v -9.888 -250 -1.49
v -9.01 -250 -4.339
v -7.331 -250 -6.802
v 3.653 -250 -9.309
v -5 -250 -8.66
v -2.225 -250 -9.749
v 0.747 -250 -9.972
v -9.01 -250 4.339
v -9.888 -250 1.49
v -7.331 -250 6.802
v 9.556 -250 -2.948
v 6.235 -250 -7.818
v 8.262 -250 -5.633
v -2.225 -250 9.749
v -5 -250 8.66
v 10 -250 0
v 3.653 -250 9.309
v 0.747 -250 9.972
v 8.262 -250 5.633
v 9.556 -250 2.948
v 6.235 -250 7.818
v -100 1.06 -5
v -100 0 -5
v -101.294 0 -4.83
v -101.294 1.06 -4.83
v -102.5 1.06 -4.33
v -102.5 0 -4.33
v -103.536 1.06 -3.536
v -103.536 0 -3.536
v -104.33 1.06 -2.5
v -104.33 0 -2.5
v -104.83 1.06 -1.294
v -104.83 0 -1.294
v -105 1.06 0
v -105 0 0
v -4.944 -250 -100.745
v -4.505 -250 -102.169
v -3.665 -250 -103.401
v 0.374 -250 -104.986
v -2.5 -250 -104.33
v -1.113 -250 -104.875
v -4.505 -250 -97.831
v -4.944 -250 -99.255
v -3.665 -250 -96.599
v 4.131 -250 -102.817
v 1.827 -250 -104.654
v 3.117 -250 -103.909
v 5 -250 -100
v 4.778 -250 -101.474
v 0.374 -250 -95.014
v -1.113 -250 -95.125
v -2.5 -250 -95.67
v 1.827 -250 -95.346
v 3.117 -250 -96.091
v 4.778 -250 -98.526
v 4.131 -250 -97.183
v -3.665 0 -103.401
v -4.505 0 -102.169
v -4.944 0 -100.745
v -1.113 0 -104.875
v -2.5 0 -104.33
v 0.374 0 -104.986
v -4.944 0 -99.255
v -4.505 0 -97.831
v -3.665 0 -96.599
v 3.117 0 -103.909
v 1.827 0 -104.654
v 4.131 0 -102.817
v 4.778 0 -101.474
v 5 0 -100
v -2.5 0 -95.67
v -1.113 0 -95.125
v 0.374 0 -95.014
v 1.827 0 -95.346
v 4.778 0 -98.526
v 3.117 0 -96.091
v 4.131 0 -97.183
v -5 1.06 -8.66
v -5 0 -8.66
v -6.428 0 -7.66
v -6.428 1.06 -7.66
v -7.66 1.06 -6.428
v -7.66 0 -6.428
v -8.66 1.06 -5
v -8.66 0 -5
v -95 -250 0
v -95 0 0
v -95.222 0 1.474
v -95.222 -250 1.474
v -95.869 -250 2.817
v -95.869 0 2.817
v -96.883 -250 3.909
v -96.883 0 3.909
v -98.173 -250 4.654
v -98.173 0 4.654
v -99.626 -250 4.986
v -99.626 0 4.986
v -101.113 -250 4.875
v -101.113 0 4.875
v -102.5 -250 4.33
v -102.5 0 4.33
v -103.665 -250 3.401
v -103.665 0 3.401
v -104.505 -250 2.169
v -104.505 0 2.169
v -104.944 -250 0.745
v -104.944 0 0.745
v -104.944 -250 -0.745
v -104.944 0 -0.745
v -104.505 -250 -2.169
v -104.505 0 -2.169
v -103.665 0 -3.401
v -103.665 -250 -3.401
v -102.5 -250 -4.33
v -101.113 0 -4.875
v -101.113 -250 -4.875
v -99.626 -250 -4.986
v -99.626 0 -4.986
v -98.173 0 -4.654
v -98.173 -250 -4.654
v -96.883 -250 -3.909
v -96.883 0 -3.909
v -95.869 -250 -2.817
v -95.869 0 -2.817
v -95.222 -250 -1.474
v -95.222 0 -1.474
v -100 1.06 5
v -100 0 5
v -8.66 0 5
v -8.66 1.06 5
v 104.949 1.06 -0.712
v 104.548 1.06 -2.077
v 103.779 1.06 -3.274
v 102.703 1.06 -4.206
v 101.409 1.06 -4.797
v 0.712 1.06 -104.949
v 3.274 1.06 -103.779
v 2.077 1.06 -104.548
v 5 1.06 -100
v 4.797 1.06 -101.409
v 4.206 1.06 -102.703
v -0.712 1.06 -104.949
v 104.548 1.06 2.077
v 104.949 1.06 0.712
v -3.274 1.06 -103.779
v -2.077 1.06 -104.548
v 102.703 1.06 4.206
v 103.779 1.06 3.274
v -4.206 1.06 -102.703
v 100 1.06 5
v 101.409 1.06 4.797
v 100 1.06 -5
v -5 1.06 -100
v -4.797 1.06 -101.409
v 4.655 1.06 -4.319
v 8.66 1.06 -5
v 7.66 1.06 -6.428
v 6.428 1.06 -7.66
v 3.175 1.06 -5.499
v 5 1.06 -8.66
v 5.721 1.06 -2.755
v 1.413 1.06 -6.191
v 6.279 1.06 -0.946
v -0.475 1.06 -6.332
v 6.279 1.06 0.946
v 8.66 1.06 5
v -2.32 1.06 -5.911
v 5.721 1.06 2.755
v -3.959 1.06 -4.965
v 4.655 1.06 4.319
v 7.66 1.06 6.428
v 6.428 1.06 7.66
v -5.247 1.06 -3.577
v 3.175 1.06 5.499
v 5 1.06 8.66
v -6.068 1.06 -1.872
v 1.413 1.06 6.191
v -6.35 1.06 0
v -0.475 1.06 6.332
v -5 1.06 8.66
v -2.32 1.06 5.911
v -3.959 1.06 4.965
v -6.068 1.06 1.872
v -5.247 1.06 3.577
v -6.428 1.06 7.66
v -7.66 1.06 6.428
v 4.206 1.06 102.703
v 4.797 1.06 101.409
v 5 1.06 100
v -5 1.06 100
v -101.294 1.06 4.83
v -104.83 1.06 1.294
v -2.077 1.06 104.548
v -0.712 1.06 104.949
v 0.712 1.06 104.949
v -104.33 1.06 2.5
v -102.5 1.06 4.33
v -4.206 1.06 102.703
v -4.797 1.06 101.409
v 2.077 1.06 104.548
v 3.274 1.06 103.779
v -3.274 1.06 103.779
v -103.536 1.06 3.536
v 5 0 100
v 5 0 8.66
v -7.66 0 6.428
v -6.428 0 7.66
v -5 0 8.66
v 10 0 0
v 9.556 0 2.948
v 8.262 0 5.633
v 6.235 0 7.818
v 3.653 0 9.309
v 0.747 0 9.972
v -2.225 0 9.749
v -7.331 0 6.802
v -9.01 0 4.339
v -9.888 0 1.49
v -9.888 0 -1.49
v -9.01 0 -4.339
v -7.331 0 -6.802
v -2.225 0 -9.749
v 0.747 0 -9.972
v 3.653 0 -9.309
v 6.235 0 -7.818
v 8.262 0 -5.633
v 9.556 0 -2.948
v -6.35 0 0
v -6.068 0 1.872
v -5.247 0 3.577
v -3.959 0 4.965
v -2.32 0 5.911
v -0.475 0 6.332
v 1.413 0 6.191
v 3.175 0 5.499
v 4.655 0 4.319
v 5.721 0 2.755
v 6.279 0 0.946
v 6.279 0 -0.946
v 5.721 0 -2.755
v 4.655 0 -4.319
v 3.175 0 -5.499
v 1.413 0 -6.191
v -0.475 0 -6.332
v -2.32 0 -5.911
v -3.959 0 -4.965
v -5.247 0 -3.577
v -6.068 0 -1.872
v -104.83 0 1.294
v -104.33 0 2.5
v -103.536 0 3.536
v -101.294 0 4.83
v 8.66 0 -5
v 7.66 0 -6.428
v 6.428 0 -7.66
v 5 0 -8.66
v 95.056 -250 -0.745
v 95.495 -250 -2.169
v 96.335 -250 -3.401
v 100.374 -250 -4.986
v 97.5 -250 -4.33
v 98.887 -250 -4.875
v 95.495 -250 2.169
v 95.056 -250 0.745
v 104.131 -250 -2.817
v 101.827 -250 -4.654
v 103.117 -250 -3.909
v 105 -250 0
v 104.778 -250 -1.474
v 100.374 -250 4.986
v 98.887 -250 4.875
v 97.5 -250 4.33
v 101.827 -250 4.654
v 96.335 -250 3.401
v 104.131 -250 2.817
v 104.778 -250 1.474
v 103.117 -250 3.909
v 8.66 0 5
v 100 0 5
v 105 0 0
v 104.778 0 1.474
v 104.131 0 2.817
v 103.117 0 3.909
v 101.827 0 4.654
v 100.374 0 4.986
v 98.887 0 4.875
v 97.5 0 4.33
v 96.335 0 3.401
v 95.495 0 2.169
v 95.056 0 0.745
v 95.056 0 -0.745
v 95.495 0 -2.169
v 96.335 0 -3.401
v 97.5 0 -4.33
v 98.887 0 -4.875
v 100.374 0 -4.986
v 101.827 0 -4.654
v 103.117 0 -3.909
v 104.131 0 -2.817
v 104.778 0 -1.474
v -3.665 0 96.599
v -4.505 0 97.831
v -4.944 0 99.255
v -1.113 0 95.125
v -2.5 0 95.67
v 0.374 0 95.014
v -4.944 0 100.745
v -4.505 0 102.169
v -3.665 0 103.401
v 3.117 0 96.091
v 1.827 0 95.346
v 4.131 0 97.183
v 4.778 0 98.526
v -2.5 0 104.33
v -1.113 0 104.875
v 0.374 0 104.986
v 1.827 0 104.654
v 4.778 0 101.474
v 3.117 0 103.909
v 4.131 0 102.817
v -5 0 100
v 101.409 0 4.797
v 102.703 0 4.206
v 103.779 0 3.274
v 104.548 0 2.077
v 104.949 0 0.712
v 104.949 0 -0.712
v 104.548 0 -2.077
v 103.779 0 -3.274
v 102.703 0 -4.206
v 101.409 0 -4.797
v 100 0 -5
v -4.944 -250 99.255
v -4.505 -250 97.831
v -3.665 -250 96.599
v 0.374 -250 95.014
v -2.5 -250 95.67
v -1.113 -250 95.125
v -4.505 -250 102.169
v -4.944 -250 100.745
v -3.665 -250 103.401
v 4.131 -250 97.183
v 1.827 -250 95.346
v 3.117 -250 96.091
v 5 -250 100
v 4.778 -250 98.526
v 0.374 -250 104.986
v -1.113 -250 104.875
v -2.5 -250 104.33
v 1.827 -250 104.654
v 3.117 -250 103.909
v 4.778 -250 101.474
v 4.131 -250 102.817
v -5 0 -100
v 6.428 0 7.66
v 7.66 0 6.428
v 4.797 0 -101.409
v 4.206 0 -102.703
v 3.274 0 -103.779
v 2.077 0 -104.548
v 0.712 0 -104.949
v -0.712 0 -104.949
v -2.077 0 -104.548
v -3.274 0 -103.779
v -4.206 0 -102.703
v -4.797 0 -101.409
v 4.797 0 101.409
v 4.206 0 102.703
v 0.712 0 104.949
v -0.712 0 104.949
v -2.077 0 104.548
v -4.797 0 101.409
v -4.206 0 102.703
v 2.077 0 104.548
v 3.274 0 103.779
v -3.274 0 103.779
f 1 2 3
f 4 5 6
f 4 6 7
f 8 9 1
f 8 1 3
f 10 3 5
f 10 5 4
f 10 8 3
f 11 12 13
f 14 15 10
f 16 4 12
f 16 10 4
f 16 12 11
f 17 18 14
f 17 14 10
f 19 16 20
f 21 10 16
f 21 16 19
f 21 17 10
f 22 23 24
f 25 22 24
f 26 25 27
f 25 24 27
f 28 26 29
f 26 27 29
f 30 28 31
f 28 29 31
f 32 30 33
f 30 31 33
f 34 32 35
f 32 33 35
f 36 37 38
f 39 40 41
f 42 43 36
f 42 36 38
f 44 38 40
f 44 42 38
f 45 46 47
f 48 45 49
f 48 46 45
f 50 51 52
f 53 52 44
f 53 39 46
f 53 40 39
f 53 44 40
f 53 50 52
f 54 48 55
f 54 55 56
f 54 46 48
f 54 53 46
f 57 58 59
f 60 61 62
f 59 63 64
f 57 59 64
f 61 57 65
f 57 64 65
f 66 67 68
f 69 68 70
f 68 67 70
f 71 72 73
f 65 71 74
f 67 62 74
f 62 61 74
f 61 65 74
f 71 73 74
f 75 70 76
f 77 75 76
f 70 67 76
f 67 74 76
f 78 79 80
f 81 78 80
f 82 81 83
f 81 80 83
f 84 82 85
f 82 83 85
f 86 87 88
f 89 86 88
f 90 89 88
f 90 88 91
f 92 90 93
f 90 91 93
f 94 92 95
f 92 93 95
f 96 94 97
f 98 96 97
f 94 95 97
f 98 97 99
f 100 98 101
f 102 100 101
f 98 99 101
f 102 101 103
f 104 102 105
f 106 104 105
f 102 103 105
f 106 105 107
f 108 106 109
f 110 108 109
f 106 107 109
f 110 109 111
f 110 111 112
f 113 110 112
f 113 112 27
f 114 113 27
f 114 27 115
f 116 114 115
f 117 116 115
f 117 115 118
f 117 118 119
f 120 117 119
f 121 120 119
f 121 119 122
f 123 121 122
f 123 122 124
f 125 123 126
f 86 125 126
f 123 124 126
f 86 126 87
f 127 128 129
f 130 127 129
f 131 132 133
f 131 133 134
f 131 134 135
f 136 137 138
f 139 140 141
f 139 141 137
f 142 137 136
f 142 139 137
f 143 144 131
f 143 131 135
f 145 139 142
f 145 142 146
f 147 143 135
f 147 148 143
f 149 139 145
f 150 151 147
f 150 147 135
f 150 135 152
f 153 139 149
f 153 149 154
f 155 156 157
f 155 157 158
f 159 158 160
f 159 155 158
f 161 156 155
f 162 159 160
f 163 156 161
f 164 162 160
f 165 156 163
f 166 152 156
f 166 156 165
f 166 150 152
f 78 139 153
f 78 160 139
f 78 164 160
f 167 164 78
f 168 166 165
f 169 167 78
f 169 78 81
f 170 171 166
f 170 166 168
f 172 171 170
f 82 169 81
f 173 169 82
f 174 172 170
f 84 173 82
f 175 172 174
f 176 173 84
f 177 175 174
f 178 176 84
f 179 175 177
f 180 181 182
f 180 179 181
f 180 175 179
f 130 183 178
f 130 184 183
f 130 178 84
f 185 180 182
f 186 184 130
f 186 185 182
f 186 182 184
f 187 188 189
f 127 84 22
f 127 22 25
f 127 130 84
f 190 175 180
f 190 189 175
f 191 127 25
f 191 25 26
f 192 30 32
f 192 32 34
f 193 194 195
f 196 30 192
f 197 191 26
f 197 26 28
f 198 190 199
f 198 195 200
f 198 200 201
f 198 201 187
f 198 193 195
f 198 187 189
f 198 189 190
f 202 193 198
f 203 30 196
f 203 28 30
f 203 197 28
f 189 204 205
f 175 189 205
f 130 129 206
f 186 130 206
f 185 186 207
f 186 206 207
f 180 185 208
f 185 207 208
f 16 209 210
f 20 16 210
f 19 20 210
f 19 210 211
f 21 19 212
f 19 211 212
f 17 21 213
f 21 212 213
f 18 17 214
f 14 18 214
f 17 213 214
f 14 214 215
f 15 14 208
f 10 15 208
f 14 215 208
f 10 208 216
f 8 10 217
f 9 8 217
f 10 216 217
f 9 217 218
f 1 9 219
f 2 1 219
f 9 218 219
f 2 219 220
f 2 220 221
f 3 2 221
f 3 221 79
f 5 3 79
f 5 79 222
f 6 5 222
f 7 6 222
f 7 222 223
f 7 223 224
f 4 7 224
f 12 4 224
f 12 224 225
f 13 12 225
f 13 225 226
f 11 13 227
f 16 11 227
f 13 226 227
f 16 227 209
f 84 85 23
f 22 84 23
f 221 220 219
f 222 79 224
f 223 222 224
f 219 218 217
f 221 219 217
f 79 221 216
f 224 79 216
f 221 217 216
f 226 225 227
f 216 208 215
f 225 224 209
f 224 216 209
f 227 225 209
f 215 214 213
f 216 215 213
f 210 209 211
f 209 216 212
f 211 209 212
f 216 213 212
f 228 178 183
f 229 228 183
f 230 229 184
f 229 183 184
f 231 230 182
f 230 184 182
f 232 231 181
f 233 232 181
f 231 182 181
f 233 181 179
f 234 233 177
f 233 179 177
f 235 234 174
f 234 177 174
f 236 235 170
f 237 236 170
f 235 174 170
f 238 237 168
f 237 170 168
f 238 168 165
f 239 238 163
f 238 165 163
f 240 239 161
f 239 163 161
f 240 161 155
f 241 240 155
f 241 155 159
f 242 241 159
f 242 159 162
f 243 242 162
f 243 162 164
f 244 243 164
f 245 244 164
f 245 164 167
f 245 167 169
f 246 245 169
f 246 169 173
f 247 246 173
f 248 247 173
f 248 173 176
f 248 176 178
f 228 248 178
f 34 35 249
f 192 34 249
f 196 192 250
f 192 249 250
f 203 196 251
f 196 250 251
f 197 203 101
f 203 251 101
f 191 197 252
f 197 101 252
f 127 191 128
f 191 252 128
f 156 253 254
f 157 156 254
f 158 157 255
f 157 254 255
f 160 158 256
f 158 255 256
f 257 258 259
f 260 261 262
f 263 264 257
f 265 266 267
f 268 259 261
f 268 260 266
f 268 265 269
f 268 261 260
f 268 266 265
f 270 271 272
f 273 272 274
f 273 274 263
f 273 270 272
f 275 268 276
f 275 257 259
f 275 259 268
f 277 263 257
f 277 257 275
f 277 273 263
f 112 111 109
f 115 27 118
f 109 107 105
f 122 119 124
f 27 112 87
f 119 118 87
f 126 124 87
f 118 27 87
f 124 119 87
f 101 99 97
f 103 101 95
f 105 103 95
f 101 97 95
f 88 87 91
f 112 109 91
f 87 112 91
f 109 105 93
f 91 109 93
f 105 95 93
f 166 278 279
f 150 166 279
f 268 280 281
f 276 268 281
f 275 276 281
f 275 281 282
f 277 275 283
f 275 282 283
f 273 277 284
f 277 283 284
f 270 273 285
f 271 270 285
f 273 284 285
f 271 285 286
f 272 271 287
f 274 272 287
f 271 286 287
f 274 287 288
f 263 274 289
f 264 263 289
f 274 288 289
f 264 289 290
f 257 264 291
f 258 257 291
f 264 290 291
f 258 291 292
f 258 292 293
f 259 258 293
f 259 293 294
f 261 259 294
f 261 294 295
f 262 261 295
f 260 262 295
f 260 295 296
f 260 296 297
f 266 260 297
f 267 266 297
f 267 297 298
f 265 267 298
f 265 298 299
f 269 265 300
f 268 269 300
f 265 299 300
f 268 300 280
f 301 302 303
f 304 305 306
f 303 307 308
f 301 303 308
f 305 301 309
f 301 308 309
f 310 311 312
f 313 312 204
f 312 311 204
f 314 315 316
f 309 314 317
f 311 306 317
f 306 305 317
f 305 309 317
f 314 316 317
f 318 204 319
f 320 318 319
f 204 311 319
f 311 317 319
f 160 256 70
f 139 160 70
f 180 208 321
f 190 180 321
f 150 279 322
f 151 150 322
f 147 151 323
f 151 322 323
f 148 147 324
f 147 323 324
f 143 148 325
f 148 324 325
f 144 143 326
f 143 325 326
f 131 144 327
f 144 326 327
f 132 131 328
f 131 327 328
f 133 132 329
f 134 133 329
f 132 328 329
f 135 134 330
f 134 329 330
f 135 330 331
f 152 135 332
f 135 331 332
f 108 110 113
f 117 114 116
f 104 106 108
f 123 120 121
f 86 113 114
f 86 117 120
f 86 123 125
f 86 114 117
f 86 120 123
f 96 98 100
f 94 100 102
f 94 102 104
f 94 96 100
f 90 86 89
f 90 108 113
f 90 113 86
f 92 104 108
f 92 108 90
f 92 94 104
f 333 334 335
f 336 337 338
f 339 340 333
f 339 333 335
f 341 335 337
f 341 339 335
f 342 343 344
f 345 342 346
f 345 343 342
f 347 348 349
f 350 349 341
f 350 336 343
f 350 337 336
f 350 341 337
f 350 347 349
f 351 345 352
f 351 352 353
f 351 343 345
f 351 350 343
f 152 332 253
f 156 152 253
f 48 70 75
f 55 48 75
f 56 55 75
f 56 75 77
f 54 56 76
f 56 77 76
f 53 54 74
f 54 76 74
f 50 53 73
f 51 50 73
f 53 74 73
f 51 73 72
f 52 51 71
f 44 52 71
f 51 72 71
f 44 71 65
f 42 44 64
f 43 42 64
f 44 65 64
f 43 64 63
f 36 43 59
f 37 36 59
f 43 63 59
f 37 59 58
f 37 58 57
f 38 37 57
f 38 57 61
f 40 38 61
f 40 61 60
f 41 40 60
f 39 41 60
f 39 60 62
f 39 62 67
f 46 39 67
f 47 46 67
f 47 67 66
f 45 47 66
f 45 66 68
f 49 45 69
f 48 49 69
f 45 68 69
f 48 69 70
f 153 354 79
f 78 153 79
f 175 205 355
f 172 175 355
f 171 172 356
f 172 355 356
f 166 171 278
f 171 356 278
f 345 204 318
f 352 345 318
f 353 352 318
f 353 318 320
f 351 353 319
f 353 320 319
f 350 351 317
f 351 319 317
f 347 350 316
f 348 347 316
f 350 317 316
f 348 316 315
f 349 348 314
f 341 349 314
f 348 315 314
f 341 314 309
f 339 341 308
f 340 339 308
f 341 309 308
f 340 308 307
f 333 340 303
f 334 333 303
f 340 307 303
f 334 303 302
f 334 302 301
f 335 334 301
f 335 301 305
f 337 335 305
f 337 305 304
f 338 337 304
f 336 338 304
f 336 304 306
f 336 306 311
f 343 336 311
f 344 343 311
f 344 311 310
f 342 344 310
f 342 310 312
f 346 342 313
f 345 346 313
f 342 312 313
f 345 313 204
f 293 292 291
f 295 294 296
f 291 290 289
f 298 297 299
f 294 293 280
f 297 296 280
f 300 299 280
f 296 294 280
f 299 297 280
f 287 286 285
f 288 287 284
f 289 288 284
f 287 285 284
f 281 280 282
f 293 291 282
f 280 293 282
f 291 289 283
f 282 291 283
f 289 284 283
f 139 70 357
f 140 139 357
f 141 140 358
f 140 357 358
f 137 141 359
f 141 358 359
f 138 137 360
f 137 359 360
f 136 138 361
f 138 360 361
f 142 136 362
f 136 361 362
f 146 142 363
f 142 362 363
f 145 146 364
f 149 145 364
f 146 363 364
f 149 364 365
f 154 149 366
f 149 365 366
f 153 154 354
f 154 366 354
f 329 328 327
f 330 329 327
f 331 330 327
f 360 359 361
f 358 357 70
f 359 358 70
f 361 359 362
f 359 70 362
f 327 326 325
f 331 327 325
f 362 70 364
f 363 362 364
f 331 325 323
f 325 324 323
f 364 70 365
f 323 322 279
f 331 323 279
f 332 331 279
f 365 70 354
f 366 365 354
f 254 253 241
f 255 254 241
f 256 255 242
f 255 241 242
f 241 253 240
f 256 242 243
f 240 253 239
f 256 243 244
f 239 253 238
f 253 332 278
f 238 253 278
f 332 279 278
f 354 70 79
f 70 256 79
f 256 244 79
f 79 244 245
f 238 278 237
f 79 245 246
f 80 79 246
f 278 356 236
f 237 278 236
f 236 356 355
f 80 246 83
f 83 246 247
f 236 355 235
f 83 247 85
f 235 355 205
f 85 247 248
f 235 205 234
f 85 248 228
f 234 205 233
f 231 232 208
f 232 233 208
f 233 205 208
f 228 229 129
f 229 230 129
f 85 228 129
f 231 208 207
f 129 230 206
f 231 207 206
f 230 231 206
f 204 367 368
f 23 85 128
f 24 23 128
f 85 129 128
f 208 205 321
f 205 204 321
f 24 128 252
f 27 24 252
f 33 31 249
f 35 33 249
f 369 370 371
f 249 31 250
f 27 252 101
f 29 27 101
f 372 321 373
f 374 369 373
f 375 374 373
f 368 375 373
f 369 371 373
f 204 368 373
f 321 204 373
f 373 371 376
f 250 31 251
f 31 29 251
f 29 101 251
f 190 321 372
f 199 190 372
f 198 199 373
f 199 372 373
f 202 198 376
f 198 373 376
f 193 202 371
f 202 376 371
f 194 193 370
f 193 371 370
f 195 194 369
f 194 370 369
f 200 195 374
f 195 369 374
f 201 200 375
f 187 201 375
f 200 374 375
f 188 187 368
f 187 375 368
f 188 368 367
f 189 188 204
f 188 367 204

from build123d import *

# Parameters (mm, degrees)
F0_R     = 10
F1_DEPTH = 250
F0_R_2   = 5
F3_DEPTH = 1.06
F4_R     = 6.35
F5_DEPTH = 50


with BuildPart() as f1:
    # F0 (on Front) → F1 (new body)
    with BuildSketch(Plane.XZ):
        Circle(F0_R)
    extrude(amount=F1_DEPTH)


with BuildPart() as f1b:
    # F0 (on Front) → F1, piece 2 (new body)
    with BuildSketch(Plane.XZ):
        with Locations((-100, 0)):
            Circle(F0_R_2)
    extrude(amount=F1_DEPTH)


with BuildPart() as f1c:
    # F0 (on Front) → F1, piece 3 (new body)
    with BuildSketch(Plane.XZ):
        with Locations((0, -100)):
            Circle(F0_R_2)
    extrude(amount=F1_DEPTH)


with BuildPart() as f1d:
    # F0 (on Front) → F1, piece 4 (new body)
    with BuildSketch(Plane.XZ):
        with Locations((100, 0)):
            Circle(F0_R_2)
    extrude(amount=F1_DEPTH)


with BuildPart() as f1e:
    # F0 (on Front) → F1, piece 5 (new body)
    with BuildSketch(Plane.XZ):
        with Locations((0, 100)):
            Circle(F0_R_2)
    extrude(amount=F1_DEPTH)


with BuildPart() as f3:
    # F2 (on face) → F3 (new body)
    with BuildSketch(Plane(origin=(0, 0, 0), x_dir=(-1, 0, 0), z_dir=(0, 1, 0))):
        with BuildLine():
            ThreePointArc((8.6602540378, -5), (9.6592582629, -2.588190451), (10, 0))
            ThreePointArc((10, 0), (9.6592582629, 2.588190451), (8.6602540378, 5))
            ThreePointArc((8.6602540378, 5), (7.0710678119, 7.0710678119), (5, 8.6602540378))
            ThreePointArc((5, 8.6602540378), (0, 10), (-5, 8.6602540378))
            ThreePointArc((-5, 8.6602540378), (-7.0710678119, 7.0710678119), (-8.6602540378, 5))
            ThreePointArc((-8.6602540378, 5), (-10, 0), (-8.6602540378, -5))
            ThreePointArc((-8.6602540378, -5), (-7.0710678119, -7.0710678119), (-5, -8.6602540378))
            ThreePointArc((-5, -8.6602540378), (0, -10), (5, -8.6602540378))
            ThreePointArc((5, -8.6602540378), (7.0710678119, -7.0710678119), (8.6602540378, -5))
        make_face()
        with BuildLine():
            ThreePointArc((8.6602540378, 5), (9.6592582629, 2.588190451), (10, 0))
            ThreePointArc((10, 0), (9.6592582629, -2.588190451), (8.6602540378, -5))
            Line((8.6602540378, -5), (100, -5))
            ThreePointArc((100, -5), (95, 0), (100, 5))
            Line((100, 5), (8.6602540378, 5))
        make_face()
        with BuildLine():
            ThreePointArc((-5, 8.6602540378), (0, 10), (5, 8.6602540378))
            Line((5, 8.6602540378), (5, 100))
            ThreePointArc((5, 100), (0, 95), (-5, 100))
            Line((-5, 100), (-5, 8.6602540378))
        make_face()
        with BuildLine():
            ThreePointArc((105, 0), (103.5355339059, 3.5355339059), (100, 5))
            ThreePointArc((100, 5), (95, 0), (100, -5))
            ThreePointArc((100, -5), (103.5355339059, -3.5355339059), (105, 0))
        make_face()
        with BuildLine():
            Line((5, -100), (5, -8.6602540378))
            ThreePointArc((5, -8.6602540378), (0, -10), (-5, -8.6602540378))
            Line((-5, -8.6602540378), (-5, -100))
            ThreePointArc((-5, -100), (0, -95), (5, -100))
        make_face()
        with BuildLine():
            ThreePointArc((-5, 100), (0, 95), (5, 100))
            ThreePointArc((5, 100), (0, 105), (-5, 100))
        make_face()
        with BuildLine():
            ThreePointArc((-5, -100), (0, -105), (5, -100))
            ThreePointArc((5, -100), (0, -95), (-5, -100))
        make_face()
        with BuildLine():
            ThreePointArc((-8.6602540378, -5), (-10, 0), (-8.6602540378, 5))
            Line((-8.6602540378, 5), (-100, 5))
            ThreePointArc((-100, 5), (-96.4644660941, 3.5355339059), (-95, 0))
            ThreePointArc((-95, 0), (-96.4644660941, -3.5355339059), (-100, -5))
            Line((-100, -5), (-8.6602540378, -5))
        make_face()
        with BuildLine():
            ThreePointArc((-95, 0), (-96.4644660941, 3.5355339059), (-100, 5))
            ThreePointArc((-100, 5), (-105, 0), (-100, -5))
            ThreePointArc((-100, -5), (-96.4644660941, -3.5355339059), (-95, 0))
        make_face()
    extrude(amount=F3_DEPTH)

    # F4 (on face) → F5 (cut)
    with BuildSketch(Plane(origin=(0, 1.06, 0), x_dir=(-1, 0, 0), z_dir=(0, 1, 0))):
        Circle(F4_R)
    extrude(amount=-F5_DEPTH, mode=Mode.SUBTRACT)


solid = Compound([f1.part, f1b.part, f1c.part, f1d.part, f1e.part, f3.part])
